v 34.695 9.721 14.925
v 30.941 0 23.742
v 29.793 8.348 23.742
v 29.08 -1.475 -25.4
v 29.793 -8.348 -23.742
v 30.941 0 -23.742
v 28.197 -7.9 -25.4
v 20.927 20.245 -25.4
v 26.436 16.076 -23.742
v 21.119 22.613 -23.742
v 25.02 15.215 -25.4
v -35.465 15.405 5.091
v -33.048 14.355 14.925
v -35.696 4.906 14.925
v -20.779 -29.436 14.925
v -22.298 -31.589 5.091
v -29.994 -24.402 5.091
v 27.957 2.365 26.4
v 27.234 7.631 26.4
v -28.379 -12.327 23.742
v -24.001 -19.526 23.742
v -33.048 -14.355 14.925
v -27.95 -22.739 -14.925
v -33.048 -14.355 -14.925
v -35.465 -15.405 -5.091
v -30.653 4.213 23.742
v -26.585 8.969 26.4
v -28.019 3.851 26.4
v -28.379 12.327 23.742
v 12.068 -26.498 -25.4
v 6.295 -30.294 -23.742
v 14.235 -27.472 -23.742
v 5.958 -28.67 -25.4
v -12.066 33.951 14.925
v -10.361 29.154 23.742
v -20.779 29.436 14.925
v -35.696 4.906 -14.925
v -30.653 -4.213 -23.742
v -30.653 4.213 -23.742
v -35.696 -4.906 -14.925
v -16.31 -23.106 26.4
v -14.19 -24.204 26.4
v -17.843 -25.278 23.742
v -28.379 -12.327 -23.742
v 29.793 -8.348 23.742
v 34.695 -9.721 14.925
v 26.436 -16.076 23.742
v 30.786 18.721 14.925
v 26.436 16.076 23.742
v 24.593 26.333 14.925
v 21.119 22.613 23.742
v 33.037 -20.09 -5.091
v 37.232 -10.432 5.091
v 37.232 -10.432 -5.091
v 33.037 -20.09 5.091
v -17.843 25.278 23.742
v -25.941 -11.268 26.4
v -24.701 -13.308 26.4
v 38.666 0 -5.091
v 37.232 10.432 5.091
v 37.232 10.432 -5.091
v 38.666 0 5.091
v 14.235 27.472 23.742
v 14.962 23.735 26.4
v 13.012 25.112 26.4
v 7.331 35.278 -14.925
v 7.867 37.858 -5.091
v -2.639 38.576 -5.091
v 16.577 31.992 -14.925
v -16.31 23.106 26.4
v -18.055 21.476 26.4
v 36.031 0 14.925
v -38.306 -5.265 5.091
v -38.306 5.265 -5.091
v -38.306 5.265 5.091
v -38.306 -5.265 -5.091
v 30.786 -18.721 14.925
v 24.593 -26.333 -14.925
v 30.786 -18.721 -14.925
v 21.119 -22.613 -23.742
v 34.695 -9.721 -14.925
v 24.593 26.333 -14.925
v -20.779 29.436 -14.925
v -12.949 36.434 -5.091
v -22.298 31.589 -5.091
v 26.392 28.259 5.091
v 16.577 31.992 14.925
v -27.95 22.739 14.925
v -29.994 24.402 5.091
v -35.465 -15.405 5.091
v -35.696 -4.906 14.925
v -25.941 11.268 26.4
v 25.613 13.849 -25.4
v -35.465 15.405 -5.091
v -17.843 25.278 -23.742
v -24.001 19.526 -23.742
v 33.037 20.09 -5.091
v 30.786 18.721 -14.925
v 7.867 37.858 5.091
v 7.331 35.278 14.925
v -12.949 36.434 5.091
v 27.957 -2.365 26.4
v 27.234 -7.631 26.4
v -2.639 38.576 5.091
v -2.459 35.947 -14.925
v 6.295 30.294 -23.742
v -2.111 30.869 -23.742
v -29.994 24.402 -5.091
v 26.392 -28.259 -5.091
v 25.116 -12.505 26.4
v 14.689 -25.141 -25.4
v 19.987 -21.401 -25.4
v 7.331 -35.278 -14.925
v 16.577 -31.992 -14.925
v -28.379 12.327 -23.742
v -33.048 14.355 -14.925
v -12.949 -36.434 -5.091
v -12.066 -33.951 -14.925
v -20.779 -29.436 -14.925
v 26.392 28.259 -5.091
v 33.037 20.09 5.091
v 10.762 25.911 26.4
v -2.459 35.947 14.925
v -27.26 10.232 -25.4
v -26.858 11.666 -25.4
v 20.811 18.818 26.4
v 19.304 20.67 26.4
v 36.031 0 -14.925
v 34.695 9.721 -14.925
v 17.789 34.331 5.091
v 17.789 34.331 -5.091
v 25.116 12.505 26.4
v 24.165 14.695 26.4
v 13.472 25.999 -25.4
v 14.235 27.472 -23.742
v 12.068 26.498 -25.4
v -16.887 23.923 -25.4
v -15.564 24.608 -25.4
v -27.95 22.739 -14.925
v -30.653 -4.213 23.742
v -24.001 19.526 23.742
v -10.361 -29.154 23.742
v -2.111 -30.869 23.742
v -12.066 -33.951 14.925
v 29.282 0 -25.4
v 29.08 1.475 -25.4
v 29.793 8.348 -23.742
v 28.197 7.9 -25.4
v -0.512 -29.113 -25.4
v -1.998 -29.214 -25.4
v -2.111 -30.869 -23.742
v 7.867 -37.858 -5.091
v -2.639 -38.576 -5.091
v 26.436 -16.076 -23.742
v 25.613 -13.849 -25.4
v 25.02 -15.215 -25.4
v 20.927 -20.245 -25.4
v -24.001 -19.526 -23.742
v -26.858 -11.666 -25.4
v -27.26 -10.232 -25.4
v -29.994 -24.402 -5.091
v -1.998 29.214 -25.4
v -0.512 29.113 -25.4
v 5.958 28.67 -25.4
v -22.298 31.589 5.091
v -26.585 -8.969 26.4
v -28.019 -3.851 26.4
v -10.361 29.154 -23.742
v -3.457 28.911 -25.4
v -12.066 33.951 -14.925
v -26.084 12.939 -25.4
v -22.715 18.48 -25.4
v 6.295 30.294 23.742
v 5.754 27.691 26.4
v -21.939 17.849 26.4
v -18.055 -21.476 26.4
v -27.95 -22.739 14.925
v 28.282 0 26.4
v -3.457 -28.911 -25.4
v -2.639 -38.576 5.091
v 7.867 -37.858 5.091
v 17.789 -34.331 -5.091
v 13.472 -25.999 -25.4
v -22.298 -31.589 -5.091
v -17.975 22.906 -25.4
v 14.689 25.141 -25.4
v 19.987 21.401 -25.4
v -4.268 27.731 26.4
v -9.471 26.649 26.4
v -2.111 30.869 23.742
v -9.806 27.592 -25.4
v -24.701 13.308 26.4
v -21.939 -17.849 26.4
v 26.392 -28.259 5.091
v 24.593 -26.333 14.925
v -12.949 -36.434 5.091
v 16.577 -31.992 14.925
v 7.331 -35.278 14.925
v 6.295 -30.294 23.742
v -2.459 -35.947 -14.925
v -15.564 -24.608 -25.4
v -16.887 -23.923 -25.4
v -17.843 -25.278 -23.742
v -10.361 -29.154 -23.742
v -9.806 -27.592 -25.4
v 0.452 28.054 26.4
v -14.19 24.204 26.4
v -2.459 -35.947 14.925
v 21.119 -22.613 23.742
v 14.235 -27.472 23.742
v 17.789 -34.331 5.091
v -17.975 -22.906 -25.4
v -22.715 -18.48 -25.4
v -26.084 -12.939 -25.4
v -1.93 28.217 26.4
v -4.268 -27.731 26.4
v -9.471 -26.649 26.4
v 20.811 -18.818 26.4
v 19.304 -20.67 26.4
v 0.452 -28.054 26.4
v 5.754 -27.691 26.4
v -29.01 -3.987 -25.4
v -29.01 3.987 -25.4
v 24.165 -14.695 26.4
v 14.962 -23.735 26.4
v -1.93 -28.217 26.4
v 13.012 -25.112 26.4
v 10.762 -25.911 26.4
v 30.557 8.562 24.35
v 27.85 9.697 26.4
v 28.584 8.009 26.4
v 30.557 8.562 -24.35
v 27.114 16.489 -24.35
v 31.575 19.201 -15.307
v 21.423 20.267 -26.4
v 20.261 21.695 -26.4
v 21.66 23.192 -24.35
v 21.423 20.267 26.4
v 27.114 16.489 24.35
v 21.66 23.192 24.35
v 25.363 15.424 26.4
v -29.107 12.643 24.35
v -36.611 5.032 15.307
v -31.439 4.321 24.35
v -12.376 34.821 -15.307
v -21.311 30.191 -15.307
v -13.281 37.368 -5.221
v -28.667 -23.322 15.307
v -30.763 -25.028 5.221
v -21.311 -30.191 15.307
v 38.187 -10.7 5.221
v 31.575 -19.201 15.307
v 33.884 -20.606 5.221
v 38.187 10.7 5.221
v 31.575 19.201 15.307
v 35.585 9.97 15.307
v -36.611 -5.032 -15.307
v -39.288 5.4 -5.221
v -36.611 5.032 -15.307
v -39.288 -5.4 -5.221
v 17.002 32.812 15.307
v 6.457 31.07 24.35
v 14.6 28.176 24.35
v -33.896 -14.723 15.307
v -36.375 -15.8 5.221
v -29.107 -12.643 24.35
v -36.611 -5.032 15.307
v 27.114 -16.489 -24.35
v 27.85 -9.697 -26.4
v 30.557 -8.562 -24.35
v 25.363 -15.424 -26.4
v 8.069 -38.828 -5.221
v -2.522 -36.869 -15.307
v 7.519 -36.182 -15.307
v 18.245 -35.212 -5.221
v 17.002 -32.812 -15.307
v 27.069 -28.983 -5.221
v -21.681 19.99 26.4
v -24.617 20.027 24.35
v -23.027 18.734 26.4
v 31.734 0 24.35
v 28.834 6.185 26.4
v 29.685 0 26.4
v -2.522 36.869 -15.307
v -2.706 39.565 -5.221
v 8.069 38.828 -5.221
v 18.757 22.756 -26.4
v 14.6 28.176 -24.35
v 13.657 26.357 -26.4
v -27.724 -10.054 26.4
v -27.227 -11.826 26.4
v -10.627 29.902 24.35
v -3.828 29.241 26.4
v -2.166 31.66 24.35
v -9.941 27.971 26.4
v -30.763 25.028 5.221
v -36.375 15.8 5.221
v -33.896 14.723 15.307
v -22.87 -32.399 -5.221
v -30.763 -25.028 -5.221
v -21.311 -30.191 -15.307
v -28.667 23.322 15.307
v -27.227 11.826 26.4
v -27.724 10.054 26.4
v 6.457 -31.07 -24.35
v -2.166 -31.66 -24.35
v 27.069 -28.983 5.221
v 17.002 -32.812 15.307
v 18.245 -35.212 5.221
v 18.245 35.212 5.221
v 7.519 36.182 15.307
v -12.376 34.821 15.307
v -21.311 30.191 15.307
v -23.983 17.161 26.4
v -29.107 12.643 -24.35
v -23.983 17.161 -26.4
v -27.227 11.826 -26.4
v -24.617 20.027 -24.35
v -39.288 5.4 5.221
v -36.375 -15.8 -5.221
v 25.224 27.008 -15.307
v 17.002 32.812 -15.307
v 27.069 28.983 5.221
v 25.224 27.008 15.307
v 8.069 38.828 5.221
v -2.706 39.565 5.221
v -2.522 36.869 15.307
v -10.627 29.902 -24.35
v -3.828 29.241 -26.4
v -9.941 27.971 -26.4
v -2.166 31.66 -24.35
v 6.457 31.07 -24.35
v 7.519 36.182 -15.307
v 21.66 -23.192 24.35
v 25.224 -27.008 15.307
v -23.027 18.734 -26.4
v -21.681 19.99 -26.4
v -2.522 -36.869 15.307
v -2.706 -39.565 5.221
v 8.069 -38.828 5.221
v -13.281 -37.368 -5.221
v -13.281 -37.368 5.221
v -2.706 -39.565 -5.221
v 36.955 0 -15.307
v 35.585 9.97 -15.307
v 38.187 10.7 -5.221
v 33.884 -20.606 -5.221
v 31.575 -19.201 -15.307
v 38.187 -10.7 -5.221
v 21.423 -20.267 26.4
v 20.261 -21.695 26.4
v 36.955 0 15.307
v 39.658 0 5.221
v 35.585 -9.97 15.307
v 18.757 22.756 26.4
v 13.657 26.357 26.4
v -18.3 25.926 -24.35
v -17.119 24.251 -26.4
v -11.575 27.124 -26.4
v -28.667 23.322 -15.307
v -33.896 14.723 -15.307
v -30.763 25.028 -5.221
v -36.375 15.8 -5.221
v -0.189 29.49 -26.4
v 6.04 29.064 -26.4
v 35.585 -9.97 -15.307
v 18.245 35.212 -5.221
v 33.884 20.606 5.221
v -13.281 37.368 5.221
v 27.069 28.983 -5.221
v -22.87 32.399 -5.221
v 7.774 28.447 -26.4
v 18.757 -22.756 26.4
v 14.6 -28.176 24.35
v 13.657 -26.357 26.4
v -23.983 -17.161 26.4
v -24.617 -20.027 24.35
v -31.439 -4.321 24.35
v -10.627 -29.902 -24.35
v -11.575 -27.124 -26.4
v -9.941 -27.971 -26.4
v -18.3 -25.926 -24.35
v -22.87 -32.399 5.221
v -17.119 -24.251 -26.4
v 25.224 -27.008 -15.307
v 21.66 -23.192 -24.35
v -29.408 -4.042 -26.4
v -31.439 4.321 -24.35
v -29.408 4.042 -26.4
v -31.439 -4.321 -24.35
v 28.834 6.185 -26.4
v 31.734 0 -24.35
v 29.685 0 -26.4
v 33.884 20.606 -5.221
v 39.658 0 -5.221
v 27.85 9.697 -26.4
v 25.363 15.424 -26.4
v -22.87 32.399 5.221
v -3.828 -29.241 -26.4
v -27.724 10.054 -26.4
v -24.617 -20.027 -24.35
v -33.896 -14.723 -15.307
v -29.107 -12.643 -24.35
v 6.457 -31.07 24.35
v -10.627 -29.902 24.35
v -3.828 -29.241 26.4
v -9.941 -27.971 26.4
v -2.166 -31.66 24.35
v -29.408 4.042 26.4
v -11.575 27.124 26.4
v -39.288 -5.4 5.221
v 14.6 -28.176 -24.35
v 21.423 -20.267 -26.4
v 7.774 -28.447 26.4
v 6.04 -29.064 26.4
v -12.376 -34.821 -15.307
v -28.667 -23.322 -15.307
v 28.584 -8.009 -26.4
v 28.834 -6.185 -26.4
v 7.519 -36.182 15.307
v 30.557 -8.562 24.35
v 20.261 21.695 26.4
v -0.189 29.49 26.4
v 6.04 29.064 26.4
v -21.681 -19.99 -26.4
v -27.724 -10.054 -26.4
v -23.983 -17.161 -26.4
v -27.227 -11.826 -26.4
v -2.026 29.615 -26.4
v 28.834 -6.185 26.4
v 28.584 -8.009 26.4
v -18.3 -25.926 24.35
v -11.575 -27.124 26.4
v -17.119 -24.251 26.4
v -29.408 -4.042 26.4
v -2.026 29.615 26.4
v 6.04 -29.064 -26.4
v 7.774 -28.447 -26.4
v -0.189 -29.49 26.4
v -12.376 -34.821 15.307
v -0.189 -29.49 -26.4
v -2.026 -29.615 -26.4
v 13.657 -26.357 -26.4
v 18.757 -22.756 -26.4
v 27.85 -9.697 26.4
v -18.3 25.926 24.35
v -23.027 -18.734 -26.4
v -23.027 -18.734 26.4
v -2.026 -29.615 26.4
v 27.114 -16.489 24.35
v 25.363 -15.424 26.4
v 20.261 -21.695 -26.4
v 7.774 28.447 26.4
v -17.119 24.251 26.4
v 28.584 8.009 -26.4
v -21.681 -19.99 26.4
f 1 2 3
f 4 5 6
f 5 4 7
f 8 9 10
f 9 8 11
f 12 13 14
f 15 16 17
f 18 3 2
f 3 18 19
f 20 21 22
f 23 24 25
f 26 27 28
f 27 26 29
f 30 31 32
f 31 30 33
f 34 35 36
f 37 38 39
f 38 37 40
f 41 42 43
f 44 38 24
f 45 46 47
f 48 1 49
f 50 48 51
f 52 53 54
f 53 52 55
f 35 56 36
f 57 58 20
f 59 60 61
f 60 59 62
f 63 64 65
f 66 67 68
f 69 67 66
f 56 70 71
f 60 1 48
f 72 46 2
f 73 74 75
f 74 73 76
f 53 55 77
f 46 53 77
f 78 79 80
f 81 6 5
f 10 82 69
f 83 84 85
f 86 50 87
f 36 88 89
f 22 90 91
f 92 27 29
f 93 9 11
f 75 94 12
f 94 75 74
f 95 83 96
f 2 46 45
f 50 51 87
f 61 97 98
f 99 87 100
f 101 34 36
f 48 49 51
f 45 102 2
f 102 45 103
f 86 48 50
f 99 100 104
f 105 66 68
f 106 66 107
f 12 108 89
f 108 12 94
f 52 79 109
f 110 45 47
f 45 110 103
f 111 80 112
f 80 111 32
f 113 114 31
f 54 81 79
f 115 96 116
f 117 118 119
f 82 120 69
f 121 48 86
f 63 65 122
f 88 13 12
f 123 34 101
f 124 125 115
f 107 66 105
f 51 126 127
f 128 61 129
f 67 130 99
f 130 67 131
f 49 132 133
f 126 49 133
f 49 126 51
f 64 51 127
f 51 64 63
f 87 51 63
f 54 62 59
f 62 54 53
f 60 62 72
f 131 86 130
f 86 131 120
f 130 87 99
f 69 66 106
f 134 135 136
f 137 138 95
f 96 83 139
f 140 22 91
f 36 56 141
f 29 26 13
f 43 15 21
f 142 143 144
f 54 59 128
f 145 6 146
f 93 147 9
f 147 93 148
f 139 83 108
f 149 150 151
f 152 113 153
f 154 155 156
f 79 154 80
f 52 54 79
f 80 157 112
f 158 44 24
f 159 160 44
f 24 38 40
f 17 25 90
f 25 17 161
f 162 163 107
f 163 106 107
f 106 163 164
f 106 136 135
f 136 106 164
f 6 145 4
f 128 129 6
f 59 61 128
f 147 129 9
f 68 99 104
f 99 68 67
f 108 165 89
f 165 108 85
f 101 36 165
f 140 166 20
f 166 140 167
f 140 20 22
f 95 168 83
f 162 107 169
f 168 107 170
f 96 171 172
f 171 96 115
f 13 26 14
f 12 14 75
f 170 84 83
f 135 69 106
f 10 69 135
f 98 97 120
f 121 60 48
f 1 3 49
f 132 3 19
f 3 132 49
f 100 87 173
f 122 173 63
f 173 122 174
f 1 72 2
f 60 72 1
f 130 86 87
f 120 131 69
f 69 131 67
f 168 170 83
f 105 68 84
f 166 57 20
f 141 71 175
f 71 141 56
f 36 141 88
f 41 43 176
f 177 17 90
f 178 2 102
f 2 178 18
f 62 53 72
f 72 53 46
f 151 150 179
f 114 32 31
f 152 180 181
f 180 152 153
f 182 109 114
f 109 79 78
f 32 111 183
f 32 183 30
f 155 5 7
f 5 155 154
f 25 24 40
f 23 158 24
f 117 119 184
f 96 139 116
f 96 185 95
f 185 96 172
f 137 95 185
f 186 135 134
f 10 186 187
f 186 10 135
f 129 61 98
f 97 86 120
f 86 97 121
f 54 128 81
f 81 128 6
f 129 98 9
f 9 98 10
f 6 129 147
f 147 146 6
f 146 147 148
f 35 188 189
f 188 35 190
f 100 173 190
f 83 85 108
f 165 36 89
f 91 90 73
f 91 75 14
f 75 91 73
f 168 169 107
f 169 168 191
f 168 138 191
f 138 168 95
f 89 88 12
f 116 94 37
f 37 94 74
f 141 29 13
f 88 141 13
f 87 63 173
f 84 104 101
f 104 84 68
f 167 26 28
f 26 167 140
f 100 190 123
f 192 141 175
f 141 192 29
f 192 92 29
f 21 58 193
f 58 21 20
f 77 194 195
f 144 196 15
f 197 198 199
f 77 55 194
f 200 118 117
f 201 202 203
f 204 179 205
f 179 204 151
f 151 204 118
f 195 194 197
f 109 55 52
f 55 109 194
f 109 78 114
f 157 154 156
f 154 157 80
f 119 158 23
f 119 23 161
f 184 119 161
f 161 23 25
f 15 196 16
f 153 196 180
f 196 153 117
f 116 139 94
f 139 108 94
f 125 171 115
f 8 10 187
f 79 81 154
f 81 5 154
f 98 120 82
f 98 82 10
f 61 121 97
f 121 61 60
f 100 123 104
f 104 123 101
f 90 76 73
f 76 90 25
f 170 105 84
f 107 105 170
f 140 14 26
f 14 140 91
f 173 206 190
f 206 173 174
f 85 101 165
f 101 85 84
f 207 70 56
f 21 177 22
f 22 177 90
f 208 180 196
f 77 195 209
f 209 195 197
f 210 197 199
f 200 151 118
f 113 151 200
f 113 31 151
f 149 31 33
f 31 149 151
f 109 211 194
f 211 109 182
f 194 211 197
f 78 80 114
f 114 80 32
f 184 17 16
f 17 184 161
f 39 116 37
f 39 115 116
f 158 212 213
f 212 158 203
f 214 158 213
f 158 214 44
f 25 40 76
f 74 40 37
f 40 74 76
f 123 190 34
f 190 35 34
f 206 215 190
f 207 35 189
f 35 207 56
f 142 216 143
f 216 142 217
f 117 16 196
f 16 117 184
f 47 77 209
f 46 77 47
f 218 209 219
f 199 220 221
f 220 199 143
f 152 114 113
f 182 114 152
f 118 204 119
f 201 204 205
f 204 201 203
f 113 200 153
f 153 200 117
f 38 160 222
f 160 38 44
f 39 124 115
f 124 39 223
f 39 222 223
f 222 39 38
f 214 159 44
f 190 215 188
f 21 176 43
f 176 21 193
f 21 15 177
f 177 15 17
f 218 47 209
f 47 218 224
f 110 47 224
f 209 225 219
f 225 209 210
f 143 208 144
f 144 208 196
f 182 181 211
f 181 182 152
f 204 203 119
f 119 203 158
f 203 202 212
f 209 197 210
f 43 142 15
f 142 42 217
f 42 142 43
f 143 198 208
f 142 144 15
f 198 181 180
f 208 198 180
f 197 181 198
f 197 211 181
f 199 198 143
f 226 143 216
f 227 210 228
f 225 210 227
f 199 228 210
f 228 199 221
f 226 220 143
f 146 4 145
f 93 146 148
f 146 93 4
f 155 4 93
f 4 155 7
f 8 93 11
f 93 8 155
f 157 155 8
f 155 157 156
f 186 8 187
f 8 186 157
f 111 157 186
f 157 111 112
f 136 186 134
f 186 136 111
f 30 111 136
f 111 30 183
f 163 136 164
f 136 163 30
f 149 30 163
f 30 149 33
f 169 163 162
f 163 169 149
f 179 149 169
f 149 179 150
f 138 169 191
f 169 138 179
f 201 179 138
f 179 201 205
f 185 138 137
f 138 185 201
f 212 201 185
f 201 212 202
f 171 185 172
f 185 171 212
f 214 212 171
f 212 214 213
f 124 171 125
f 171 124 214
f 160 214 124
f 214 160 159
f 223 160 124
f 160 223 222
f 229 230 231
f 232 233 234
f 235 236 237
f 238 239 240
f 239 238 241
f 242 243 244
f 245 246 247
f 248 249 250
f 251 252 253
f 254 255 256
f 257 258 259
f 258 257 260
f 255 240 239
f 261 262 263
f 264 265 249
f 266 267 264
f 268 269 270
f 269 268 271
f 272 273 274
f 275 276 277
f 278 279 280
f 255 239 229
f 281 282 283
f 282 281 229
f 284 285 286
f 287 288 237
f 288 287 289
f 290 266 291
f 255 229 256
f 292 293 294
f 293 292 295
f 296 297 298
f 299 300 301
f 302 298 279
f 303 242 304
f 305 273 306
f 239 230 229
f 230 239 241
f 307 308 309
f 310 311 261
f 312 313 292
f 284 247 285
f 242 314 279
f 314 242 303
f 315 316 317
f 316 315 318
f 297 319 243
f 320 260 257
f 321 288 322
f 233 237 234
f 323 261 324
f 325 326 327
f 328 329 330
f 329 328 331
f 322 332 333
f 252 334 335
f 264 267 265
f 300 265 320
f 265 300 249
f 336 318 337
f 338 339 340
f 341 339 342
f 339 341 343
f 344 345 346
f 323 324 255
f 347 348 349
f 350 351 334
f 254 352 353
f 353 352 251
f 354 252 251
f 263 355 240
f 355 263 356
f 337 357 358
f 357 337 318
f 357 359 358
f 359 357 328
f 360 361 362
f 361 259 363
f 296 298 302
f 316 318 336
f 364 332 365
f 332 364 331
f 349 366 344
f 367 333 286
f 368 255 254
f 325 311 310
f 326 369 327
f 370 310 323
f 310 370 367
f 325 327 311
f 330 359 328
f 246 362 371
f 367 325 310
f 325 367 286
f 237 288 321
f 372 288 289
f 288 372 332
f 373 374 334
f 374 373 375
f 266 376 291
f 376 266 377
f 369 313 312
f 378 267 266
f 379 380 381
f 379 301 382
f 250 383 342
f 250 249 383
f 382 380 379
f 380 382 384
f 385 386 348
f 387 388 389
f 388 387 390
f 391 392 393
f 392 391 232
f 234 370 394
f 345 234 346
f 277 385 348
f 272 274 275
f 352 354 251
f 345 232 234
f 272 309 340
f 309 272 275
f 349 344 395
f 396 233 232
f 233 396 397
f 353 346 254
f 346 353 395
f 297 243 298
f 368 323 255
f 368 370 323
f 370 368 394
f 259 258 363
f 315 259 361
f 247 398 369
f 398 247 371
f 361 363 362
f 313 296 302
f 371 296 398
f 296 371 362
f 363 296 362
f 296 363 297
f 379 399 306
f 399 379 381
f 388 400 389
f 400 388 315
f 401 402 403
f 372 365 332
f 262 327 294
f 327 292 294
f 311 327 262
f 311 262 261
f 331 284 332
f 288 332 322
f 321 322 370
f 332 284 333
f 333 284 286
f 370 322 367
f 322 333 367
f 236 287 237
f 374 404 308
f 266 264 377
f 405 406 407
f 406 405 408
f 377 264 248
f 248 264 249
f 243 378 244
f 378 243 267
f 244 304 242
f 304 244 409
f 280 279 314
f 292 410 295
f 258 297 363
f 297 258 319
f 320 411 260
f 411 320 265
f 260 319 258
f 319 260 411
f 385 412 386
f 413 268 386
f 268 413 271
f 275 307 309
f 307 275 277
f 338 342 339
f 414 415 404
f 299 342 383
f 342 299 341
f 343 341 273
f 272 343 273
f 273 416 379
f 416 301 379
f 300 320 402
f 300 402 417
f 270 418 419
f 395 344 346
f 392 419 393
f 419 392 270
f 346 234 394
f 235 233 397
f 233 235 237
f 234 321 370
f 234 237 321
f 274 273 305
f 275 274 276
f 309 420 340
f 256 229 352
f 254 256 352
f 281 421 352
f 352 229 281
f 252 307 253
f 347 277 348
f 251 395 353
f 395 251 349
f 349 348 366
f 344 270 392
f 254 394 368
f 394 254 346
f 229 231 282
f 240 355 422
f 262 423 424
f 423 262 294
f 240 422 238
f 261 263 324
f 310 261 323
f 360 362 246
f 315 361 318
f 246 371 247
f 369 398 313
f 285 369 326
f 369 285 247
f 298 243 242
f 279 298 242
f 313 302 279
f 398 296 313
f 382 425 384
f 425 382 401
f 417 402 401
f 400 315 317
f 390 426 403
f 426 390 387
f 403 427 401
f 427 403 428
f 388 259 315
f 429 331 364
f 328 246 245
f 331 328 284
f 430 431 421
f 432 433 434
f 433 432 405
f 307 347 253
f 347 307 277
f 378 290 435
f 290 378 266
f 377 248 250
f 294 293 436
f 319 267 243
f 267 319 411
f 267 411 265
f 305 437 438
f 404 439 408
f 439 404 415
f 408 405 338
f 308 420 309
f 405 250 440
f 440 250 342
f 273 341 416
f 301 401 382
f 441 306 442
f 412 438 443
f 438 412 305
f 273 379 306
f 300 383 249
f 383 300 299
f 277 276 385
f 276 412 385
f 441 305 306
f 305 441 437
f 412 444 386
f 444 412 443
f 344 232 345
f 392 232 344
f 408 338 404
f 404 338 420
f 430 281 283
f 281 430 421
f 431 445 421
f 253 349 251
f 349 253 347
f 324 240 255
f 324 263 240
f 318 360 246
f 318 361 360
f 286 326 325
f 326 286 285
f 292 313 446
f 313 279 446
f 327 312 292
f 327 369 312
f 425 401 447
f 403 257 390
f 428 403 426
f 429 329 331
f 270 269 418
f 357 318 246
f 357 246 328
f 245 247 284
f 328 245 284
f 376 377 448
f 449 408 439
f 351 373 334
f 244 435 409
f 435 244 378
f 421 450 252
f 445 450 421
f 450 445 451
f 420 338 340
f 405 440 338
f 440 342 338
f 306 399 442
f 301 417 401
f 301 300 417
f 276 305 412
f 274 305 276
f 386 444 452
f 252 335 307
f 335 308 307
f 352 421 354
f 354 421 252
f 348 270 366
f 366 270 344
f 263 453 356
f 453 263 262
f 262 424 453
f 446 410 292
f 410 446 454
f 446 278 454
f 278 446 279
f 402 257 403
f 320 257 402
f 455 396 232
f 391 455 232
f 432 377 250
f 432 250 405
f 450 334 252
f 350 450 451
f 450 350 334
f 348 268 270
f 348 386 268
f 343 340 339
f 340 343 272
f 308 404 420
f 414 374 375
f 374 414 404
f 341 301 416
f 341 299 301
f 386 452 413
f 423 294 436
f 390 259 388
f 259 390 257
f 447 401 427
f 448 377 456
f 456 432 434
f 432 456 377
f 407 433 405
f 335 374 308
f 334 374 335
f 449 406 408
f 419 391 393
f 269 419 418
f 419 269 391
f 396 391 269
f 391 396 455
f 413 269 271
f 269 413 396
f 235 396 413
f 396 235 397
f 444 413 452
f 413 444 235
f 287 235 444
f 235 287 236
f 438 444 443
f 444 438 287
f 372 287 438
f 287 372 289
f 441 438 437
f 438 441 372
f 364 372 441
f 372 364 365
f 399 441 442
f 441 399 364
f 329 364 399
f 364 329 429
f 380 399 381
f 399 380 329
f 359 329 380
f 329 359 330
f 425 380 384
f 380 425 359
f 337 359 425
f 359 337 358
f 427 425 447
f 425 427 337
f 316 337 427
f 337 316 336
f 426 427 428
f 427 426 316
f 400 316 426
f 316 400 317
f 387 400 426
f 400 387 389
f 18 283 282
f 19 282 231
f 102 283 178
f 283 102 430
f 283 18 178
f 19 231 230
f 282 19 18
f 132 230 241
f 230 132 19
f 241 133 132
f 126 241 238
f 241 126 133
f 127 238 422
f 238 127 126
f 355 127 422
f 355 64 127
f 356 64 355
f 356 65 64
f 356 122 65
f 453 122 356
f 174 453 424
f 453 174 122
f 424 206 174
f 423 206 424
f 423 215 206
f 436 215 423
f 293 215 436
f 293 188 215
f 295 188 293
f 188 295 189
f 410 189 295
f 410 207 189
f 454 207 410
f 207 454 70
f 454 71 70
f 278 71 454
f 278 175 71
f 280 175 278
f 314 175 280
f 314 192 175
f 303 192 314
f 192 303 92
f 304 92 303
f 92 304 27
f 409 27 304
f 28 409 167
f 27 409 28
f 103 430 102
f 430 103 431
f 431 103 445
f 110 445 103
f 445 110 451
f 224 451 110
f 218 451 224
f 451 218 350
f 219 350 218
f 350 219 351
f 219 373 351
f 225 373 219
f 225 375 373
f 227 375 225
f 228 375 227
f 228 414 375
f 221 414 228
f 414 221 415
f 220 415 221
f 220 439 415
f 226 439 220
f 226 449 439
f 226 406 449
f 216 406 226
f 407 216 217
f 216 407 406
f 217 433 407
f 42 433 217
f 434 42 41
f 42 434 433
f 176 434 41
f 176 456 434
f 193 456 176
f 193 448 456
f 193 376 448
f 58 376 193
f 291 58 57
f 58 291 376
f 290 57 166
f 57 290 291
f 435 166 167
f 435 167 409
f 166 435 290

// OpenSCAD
// author: clayb.rpi@gmail.com
// date: 2014-04-06
// description: A customizable spheroid pot.

// The overall diameter.
DIAMETER = 80;

// How thick the walls are.
WALL_THICKNESS = 1;

// How tall the pot should be in proportion to the diameter.
HEIGHT_RATIO = 1;

// How much pot versus flat area there is.
POT_FLAT_RATIO = 0.66;

// How detailed the sphere rendering should be.
$fn=23;

//-----------------------------------
// Calculated parameters for brevity.
r = DIAMETER / 2;

scale([1, 1, HEIGHT_RATIO])
difference() {
  sphere(r=DIAMETER / 2);

  difference() {
    sphere(r=DIAMETER / 2 - WALL_THICKNESS);
    
    translate([-r - 1, -r - 1, r * (-1 - POT_FLAT_RATIO) + WALL_THICKNESS])
    cube([DIAMETER + 2, DIAMETER + 2, r]);
  }

  // flatten the bottom.
  translate([-r - 1, -r - 1, r * ( -1 - POT_FLAT_RATIO)])
  cube([DIAMETER + 2, DIAMETER + 2, r]);

  // flatten the top.
  translate([-r - 1, -r - 1, r * POT_FLAT_RATIO])
  cube([DIAMETER + 2, DIAMETER + 2, r]);
}
